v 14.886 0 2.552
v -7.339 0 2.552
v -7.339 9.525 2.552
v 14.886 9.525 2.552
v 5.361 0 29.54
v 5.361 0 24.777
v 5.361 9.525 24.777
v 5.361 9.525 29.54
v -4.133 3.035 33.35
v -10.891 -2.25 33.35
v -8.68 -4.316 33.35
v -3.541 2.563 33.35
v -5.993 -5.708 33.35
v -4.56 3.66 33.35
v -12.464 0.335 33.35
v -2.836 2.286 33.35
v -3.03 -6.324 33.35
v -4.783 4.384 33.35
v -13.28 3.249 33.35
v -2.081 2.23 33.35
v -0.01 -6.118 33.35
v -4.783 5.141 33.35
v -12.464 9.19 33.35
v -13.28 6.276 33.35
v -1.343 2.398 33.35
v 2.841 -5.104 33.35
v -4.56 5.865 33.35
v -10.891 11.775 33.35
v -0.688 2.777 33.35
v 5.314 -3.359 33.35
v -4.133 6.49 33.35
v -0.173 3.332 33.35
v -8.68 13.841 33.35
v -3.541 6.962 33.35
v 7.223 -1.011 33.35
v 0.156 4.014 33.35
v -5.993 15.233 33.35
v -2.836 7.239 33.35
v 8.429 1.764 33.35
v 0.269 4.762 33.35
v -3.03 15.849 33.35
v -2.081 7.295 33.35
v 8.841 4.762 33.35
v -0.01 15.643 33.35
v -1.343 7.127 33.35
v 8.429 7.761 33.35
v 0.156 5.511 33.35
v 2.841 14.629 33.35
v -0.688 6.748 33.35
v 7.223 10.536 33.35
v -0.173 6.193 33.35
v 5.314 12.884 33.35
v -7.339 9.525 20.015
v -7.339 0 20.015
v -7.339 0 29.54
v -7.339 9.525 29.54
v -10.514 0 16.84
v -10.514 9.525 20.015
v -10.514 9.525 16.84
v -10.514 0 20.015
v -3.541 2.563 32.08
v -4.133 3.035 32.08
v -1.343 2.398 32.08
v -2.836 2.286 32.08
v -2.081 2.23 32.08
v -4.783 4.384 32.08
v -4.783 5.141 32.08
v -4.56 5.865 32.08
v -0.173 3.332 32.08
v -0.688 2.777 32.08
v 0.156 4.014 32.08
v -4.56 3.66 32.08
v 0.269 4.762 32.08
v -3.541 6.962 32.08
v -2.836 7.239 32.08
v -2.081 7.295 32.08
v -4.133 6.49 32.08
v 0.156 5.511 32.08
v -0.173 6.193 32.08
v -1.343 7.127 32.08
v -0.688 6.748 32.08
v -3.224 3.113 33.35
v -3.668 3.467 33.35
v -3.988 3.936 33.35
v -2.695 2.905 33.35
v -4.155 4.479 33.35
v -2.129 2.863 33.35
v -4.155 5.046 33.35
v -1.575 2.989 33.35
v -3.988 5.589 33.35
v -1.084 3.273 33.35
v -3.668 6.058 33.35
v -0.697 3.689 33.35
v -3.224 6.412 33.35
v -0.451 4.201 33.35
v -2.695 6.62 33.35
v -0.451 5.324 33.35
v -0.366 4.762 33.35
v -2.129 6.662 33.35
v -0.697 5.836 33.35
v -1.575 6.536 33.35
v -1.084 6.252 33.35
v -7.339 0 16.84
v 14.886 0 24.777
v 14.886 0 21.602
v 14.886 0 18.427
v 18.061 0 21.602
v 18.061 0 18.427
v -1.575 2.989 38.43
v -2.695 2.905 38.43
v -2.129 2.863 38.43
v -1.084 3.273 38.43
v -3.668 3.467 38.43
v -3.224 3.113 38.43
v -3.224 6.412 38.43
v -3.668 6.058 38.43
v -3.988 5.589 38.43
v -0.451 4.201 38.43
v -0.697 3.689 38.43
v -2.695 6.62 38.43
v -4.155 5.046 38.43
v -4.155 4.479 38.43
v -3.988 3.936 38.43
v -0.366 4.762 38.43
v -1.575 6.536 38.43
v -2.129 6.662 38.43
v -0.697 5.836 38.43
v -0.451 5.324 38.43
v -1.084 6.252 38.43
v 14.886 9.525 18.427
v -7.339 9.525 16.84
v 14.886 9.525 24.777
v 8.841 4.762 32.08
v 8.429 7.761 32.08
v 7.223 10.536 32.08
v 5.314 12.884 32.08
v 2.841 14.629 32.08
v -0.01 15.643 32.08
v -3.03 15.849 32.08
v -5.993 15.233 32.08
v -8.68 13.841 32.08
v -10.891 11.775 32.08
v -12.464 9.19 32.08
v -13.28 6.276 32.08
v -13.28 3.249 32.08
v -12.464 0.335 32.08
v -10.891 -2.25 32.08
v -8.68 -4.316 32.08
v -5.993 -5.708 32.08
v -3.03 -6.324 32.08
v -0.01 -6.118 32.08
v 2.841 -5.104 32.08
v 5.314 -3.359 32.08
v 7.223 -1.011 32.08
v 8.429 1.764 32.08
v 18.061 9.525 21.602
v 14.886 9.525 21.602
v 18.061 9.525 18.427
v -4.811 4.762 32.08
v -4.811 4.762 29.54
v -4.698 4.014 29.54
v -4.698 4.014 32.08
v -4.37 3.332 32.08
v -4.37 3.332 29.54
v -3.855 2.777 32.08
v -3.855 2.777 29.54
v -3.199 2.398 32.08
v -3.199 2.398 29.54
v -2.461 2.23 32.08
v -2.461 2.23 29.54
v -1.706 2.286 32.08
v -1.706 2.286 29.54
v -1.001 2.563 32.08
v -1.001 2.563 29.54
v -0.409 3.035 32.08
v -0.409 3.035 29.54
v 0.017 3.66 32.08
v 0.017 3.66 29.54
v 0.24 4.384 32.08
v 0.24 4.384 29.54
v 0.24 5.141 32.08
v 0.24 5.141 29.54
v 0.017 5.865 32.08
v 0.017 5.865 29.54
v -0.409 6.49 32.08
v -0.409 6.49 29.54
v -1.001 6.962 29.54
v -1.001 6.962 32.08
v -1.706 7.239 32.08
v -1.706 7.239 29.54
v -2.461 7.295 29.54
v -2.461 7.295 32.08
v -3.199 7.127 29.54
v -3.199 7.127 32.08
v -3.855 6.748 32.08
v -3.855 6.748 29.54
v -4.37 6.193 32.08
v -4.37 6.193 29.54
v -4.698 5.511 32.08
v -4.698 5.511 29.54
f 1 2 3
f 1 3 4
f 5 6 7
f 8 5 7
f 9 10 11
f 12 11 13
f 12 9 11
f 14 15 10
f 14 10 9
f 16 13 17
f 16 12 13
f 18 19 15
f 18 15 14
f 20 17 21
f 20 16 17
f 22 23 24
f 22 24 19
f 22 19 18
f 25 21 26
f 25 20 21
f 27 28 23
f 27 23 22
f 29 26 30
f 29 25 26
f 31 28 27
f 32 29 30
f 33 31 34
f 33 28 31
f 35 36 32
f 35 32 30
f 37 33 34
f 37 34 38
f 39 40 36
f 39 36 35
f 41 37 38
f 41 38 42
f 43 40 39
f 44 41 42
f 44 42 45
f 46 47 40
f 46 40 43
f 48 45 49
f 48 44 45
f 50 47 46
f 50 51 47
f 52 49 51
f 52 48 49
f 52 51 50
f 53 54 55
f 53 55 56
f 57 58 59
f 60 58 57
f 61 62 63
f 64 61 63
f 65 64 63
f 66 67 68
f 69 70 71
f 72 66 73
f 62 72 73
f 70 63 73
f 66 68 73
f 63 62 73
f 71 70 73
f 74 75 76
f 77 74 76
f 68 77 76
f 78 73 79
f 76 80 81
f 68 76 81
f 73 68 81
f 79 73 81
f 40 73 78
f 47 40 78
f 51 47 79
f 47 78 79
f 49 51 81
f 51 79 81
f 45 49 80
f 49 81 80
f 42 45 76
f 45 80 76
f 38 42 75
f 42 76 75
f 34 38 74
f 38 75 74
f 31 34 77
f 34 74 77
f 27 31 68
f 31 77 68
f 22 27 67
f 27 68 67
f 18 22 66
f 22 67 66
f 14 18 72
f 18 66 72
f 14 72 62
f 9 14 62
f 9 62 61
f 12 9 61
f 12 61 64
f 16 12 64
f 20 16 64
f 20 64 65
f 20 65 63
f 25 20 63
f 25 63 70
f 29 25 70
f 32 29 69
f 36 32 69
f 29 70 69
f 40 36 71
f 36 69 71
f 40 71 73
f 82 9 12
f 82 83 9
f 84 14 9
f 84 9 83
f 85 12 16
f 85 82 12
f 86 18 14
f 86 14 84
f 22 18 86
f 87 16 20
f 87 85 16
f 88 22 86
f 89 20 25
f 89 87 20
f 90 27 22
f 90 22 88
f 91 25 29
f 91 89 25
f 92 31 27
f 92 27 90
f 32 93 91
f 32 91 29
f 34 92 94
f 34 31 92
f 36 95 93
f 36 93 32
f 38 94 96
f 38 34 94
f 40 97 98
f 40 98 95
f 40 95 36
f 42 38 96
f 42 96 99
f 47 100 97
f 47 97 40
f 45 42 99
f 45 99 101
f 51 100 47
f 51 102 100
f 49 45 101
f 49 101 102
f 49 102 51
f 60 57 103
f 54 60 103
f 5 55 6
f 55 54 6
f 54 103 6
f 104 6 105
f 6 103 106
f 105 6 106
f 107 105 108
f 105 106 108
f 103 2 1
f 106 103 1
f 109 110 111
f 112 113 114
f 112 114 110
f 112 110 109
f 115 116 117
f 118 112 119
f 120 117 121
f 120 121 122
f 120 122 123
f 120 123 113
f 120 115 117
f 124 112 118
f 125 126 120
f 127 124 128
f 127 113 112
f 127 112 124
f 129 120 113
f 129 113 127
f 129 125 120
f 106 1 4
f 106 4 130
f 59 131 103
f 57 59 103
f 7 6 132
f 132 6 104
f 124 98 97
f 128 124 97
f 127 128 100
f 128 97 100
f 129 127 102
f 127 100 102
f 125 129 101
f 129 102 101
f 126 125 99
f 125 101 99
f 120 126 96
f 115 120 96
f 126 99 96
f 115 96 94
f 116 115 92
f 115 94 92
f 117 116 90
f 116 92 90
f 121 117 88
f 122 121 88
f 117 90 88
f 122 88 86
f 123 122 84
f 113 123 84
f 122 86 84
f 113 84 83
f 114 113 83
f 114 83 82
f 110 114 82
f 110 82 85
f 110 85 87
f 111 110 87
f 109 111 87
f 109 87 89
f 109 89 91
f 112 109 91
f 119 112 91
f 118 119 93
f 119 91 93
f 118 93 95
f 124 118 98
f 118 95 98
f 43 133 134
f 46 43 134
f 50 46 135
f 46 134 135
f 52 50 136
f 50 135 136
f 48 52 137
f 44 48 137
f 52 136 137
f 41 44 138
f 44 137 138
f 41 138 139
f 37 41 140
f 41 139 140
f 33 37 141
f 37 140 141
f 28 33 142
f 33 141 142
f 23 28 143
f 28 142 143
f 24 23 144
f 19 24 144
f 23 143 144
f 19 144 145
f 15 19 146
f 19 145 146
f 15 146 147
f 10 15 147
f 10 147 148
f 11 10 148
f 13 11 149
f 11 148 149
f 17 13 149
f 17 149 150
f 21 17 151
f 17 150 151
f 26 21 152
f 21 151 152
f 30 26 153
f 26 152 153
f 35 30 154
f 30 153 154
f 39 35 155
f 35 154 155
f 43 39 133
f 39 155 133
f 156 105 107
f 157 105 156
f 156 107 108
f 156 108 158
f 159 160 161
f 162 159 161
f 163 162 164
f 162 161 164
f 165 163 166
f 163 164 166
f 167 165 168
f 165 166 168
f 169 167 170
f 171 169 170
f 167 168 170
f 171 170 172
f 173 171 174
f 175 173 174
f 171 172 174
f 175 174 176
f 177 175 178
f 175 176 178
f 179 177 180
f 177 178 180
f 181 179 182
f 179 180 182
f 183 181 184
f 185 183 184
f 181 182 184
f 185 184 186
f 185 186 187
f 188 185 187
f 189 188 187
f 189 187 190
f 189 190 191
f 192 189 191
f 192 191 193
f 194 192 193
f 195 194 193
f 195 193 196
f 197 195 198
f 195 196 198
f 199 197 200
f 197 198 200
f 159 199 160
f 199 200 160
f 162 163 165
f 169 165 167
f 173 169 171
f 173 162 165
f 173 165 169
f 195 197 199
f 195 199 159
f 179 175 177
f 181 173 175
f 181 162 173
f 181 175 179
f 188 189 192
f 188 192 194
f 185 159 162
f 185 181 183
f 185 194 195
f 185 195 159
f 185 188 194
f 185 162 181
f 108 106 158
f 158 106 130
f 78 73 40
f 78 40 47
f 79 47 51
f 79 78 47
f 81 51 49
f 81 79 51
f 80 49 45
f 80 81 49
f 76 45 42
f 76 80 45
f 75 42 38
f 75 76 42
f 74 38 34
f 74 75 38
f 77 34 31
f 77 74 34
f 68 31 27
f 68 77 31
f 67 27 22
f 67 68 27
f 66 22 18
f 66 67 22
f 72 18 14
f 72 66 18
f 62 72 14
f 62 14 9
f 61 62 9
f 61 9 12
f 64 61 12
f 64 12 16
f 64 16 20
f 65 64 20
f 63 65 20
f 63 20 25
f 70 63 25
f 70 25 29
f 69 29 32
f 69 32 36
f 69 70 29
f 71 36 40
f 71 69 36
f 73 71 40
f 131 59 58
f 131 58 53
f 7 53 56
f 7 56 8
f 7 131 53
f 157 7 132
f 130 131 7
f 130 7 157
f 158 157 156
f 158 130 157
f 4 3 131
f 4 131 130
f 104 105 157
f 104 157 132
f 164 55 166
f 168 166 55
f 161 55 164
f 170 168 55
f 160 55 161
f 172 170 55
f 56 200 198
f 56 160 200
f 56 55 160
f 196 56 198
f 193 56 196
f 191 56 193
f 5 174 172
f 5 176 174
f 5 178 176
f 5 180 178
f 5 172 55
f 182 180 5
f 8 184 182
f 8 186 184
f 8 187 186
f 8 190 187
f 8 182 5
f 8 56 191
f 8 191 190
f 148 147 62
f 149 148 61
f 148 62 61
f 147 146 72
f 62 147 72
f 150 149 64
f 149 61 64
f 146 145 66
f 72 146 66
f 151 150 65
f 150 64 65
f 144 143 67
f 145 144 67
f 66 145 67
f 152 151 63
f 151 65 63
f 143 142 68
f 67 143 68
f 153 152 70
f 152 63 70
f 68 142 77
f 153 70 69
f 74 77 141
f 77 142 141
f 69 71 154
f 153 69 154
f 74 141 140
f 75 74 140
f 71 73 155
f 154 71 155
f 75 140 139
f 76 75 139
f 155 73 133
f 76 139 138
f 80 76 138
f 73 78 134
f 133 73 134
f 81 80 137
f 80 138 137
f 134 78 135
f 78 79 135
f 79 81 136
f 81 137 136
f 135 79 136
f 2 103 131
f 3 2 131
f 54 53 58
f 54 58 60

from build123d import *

# Parameters (mm, degrees)
F0_W      = 22.225
F0_H      = 22.225
F1_DEPTH  = 9.525
F2_W      = 12.7
F2_H      = 9.525
F3_DEPTH  = 4.7625
F4_W      = 9.525
F4_H      = 3.175
F5_DEPTH  = 3.175
F6_W      = 9.525
F6_H      = 3.175
F7_DEPTH  = 3.175
F9_DEPTH  = 2.54
F10_R     = 11.1125
F10_R_2   = 2.54
F11_DEPTH = 1.27
F9_FACE_R = 2.54
F12_DEPTH = 1.27
F13_R     = 1.905
F14_DEPTH = 5.08


with BuildPart() as f1:
    # F0 (on Front) → F1 (new body)
    with BuildSketch(Plane.XZ):
        with Locations((3.77393, 13.664843)):
            Rectangle(F0_W, F0_H)
    extrude(amount=-F1_DEPTH)

    # F2 (on face) → F3 (join)
    with BuildSketch(Plane.XY.offset(24.777343)):
        with Locations((-0.98857, 4.7625)):
            Rectangle(F2_W, F2_H)
    extrude(amount=F3_DEPTH)

    # F4 (on face) → F5 (join)
    with BuildSketch(Plane.YZ.offset(14.88643)):
        with Locations((4.7625, 20.014843)):
            Rectangle(F4_W, F4_H)
    extrude(amount=F5_DEPTH)

    # F6 (on face) → F7 (join)
    with BuildSketch(Plane(origin=(-7.33857, 0, 0), x_dir=(0, -1, 0), z_dir=(-1, 0, 0))):
        with Locations((-4.7625, 18.427343)):
            Rectangle(F6_W, F6_H)
    extrude(amount=F7_DEPTH)

    # F8 (on face) → F9 (join)
    with BuildSketch(Plane.XY.offset(29.539843)):
        with BuildLine():
            ThreePointArc((0.26873, 4.7625), (-2.27127, 7.3025), (-4.81127, 4.7625))
            ThreePointArc((-4.81127, 4.7625), (-2.27127, 2.2225), (0.26873, 4.7625))
        make_face()
    extrude(amount=F9_DEPTH)


with BuildPart() as f11:
    # F10 (on face) → F11 (new body)
    with BuildSketch(Plane.XY.offset(32.079843)):
        with Locations((-2.27127, 4.7625)):
            Circle(F10_R)
        with Locations((-2.27127, 4.7625)):
            Circle(F10_R_2, mode=Mode.SUBTRACT)
    extrude(amount=F11_DEPTH)


with BuildPart() as f12:
    # F9_face (on face) → F12 (new body)
    with BuildSketch(Plane(origin=(-2.27127, 4.7625, 32.079843), x_dir=(1, 0, 0), z_dir=(0, 0, 1))):
        Circle(F9_FACE_R)
    extrude(amount=F12_DEPTH)

    # F13 (on face) → F14 (join)
    with BuildSketch(Plane.XY.offset(33.349843)):
        with Locations((-2.27127, 4.7625)):
            Circle(F13_R)
    extrude(amount=F14_DEPTH)


solid = Compound([f1.part, f11.part, f12.part])
